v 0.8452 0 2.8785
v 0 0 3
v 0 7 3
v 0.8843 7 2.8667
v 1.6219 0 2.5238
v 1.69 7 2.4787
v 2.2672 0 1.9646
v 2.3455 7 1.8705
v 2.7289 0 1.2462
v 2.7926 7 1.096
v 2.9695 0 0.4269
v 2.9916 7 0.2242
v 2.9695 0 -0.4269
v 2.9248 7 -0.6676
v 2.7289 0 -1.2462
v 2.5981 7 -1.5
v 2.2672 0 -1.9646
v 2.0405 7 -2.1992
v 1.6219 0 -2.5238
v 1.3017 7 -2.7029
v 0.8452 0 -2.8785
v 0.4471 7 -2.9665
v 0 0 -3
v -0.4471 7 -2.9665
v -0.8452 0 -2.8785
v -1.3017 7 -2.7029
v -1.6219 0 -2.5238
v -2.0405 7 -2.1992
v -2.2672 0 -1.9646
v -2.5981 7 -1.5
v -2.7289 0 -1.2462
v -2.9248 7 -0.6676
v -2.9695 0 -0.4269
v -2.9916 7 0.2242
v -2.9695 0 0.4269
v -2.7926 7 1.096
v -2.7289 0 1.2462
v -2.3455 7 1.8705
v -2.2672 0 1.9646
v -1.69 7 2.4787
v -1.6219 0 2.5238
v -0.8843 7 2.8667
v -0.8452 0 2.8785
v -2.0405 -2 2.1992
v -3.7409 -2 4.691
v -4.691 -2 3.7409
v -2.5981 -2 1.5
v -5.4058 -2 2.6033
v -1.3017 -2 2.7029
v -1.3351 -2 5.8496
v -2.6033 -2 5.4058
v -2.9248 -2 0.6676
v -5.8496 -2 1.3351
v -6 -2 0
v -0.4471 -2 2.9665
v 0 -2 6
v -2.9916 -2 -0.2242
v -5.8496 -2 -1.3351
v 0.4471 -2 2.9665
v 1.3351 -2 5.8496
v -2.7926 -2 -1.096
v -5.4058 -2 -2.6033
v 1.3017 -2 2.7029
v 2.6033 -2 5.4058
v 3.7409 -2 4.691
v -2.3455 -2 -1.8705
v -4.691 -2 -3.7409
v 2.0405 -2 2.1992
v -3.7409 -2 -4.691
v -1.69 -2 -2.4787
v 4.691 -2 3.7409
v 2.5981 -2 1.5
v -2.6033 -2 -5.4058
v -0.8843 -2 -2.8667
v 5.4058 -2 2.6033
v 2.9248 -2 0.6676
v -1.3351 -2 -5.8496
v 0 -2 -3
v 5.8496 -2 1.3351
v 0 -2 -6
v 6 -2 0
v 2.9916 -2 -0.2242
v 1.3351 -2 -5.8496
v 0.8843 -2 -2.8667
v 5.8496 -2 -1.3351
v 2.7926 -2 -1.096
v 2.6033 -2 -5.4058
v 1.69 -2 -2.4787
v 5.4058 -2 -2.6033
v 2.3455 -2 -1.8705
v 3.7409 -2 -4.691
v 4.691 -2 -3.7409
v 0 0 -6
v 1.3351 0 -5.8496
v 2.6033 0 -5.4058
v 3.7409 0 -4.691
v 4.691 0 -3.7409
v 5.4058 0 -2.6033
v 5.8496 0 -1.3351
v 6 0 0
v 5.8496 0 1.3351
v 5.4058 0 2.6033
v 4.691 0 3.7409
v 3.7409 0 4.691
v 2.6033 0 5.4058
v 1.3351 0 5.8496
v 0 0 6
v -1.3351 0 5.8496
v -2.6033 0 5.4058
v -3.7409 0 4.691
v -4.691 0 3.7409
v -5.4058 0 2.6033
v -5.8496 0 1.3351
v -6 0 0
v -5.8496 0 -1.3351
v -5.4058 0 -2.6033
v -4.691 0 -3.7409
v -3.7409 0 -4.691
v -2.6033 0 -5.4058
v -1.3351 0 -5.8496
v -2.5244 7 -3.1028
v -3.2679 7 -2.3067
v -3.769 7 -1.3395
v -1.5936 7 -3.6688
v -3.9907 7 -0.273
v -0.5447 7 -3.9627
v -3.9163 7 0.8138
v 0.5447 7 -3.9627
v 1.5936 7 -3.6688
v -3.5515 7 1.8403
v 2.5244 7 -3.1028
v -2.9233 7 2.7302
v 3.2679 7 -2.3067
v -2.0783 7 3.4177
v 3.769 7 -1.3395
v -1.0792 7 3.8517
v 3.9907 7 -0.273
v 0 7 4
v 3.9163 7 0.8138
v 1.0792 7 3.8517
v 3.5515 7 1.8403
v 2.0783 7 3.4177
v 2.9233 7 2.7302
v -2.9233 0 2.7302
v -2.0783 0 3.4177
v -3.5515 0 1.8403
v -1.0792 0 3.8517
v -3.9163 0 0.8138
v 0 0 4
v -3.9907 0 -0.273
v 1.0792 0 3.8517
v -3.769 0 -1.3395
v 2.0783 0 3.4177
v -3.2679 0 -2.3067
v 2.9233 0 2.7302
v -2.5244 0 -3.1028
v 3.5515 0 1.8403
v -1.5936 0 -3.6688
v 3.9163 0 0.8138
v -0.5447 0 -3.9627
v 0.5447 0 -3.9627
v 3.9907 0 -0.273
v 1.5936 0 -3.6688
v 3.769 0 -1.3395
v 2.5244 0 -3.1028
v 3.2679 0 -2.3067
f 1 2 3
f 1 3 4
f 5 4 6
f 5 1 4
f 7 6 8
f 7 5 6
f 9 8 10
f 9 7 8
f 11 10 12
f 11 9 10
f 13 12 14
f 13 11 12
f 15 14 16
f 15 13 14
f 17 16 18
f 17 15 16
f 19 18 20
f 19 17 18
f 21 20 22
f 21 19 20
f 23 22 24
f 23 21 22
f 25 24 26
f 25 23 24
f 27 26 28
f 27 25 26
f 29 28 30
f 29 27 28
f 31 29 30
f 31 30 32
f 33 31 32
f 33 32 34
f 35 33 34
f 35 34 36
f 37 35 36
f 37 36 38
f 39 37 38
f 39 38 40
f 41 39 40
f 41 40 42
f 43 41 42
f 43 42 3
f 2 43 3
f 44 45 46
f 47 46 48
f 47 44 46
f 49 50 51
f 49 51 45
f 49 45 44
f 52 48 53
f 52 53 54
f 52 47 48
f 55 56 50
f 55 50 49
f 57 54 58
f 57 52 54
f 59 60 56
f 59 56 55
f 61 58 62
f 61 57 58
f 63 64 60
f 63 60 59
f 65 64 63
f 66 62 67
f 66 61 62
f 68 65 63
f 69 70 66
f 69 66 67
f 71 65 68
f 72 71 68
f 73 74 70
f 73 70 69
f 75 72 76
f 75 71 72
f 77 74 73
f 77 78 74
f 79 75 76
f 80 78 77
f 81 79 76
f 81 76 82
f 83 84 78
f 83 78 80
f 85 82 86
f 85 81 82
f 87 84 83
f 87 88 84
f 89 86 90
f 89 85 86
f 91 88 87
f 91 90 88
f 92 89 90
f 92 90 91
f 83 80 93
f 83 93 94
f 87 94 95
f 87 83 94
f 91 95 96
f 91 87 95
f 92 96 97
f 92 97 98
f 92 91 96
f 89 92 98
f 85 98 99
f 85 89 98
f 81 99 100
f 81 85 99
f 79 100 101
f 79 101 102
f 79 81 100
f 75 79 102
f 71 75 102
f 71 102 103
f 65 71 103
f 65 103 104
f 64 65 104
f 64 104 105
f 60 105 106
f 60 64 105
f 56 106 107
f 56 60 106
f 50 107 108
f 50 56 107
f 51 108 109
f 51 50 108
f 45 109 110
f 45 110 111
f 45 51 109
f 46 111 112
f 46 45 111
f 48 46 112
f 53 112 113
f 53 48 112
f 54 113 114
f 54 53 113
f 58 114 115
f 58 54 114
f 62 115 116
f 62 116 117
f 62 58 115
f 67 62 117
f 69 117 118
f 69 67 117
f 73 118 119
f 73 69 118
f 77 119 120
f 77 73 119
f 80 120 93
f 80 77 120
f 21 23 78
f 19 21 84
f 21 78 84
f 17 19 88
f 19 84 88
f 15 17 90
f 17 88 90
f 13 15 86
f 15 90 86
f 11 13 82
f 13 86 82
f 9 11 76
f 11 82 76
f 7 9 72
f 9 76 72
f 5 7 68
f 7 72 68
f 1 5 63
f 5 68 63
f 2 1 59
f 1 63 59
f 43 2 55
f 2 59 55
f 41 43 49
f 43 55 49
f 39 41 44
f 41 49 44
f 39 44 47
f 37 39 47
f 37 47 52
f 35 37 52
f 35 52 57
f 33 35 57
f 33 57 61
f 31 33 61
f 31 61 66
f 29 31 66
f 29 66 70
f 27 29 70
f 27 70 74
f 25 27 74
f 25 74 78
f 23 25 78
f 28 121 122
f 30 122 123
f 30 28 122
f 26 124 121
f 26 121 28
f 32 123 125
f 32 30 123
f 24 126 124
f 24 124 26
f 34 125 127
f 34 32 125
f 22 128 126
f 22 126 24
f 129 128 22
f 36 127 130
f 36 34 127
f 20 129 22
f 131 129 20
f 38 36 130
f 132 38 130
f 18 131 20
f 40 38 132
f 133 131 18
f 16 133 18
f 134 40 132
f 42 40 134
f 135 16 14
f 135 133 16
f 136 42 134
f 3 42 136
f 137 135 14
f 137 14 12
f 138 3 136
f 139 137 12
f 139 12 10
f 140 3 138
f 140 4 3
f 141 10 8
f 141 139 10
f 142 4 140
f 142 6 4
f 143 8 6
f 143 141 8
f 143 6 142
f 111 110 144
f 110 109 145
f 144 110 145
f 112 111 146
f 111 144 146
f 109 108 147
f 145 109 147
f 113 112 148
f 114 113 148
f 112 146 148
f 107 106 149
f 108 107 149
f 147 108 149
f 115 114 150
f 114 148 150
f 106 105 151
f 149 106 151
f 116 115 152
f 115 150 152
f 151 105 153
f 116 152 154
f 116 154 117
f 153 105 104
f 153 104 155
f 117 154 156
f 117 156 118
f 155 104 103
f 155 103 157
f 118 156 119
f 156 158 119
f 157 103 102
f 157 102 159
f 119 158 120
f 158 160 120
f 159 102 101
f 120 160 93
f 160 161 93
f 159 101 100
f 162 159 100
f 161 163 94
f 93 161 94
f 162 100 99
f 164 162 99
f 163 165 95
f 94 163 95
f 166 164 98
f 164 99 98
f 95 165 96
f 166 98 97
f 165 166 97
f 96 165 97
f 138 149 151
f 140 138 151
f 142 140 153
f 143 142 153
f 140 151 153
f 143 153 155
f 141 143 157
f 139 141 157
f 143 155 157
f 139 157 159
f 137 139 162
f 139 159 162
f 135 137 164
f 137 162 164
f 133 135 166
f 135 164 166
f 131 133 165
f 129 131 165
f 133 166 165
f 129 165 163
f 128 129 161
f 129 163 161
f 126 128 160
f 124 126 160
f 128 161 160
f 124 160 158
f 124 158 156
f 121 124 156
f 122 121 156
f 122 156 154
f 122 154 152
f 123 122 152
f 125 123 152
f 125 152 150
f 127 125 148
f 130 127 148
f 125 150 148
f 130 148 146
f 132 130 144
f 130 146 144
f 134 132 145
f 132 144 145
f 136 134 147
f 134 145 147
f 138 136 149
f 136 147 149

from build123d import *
from build123d.topology import SkipClean

# Parameters (mm, degrees)
CROQUIS1_R              = 4
CROQUIS1_R_2            = 3
SALIENTE_EXTRUIR1_DEPTH = 7
SALIENTE_EXTRUIR2_START = 2
CROQUIS2_R              = 6
CROQUIS2_R_2            = 3
SALIENTE_EXTRUIR2_DEPTH = 2


with BuildPart() as part:
    # Croquis1 → Saliente-Extruir1 (new body)
    with BuildSketch(Plane(origin=(0, 0, 0), x_dir=(1, 0, 0), z_dir=(0, 1, 0))):
        with Locations(Location((0, 0, 0), (0, 0, 270))):
            Circle(CROQUIS1_R)
        with Locations(Location((0, 0, 0), (0, 0, 270))):
            Circle(CROQUIS1_R_2, mode=Mode.SUBTRACT)
    extrude(amount=SALIENTE_EXTRUIR1_DEPTH)

    # Croquis2 → Saliente-Extruir2 (add)
    with SkipClean():  # the faces are left unmerged after this step: merging them gives an invalid solid
        with BuildSketch(Plane.XZ.offset(SALIENTE_EXTRUIR2_START)):
            with Locations(Location((0, 0, 0), (0, 0, 270))):
                Circle(CROQUIS2_R)
            with Locations(Location((0, 0, 0), (0, 0, 270))):
                Circle(CROQUIS2_R_2, mode=Mode.SUBTRACT)
        extrude(amount=-SALIENTE_EXTRUIR2_DEPTH)


solid = part.part
